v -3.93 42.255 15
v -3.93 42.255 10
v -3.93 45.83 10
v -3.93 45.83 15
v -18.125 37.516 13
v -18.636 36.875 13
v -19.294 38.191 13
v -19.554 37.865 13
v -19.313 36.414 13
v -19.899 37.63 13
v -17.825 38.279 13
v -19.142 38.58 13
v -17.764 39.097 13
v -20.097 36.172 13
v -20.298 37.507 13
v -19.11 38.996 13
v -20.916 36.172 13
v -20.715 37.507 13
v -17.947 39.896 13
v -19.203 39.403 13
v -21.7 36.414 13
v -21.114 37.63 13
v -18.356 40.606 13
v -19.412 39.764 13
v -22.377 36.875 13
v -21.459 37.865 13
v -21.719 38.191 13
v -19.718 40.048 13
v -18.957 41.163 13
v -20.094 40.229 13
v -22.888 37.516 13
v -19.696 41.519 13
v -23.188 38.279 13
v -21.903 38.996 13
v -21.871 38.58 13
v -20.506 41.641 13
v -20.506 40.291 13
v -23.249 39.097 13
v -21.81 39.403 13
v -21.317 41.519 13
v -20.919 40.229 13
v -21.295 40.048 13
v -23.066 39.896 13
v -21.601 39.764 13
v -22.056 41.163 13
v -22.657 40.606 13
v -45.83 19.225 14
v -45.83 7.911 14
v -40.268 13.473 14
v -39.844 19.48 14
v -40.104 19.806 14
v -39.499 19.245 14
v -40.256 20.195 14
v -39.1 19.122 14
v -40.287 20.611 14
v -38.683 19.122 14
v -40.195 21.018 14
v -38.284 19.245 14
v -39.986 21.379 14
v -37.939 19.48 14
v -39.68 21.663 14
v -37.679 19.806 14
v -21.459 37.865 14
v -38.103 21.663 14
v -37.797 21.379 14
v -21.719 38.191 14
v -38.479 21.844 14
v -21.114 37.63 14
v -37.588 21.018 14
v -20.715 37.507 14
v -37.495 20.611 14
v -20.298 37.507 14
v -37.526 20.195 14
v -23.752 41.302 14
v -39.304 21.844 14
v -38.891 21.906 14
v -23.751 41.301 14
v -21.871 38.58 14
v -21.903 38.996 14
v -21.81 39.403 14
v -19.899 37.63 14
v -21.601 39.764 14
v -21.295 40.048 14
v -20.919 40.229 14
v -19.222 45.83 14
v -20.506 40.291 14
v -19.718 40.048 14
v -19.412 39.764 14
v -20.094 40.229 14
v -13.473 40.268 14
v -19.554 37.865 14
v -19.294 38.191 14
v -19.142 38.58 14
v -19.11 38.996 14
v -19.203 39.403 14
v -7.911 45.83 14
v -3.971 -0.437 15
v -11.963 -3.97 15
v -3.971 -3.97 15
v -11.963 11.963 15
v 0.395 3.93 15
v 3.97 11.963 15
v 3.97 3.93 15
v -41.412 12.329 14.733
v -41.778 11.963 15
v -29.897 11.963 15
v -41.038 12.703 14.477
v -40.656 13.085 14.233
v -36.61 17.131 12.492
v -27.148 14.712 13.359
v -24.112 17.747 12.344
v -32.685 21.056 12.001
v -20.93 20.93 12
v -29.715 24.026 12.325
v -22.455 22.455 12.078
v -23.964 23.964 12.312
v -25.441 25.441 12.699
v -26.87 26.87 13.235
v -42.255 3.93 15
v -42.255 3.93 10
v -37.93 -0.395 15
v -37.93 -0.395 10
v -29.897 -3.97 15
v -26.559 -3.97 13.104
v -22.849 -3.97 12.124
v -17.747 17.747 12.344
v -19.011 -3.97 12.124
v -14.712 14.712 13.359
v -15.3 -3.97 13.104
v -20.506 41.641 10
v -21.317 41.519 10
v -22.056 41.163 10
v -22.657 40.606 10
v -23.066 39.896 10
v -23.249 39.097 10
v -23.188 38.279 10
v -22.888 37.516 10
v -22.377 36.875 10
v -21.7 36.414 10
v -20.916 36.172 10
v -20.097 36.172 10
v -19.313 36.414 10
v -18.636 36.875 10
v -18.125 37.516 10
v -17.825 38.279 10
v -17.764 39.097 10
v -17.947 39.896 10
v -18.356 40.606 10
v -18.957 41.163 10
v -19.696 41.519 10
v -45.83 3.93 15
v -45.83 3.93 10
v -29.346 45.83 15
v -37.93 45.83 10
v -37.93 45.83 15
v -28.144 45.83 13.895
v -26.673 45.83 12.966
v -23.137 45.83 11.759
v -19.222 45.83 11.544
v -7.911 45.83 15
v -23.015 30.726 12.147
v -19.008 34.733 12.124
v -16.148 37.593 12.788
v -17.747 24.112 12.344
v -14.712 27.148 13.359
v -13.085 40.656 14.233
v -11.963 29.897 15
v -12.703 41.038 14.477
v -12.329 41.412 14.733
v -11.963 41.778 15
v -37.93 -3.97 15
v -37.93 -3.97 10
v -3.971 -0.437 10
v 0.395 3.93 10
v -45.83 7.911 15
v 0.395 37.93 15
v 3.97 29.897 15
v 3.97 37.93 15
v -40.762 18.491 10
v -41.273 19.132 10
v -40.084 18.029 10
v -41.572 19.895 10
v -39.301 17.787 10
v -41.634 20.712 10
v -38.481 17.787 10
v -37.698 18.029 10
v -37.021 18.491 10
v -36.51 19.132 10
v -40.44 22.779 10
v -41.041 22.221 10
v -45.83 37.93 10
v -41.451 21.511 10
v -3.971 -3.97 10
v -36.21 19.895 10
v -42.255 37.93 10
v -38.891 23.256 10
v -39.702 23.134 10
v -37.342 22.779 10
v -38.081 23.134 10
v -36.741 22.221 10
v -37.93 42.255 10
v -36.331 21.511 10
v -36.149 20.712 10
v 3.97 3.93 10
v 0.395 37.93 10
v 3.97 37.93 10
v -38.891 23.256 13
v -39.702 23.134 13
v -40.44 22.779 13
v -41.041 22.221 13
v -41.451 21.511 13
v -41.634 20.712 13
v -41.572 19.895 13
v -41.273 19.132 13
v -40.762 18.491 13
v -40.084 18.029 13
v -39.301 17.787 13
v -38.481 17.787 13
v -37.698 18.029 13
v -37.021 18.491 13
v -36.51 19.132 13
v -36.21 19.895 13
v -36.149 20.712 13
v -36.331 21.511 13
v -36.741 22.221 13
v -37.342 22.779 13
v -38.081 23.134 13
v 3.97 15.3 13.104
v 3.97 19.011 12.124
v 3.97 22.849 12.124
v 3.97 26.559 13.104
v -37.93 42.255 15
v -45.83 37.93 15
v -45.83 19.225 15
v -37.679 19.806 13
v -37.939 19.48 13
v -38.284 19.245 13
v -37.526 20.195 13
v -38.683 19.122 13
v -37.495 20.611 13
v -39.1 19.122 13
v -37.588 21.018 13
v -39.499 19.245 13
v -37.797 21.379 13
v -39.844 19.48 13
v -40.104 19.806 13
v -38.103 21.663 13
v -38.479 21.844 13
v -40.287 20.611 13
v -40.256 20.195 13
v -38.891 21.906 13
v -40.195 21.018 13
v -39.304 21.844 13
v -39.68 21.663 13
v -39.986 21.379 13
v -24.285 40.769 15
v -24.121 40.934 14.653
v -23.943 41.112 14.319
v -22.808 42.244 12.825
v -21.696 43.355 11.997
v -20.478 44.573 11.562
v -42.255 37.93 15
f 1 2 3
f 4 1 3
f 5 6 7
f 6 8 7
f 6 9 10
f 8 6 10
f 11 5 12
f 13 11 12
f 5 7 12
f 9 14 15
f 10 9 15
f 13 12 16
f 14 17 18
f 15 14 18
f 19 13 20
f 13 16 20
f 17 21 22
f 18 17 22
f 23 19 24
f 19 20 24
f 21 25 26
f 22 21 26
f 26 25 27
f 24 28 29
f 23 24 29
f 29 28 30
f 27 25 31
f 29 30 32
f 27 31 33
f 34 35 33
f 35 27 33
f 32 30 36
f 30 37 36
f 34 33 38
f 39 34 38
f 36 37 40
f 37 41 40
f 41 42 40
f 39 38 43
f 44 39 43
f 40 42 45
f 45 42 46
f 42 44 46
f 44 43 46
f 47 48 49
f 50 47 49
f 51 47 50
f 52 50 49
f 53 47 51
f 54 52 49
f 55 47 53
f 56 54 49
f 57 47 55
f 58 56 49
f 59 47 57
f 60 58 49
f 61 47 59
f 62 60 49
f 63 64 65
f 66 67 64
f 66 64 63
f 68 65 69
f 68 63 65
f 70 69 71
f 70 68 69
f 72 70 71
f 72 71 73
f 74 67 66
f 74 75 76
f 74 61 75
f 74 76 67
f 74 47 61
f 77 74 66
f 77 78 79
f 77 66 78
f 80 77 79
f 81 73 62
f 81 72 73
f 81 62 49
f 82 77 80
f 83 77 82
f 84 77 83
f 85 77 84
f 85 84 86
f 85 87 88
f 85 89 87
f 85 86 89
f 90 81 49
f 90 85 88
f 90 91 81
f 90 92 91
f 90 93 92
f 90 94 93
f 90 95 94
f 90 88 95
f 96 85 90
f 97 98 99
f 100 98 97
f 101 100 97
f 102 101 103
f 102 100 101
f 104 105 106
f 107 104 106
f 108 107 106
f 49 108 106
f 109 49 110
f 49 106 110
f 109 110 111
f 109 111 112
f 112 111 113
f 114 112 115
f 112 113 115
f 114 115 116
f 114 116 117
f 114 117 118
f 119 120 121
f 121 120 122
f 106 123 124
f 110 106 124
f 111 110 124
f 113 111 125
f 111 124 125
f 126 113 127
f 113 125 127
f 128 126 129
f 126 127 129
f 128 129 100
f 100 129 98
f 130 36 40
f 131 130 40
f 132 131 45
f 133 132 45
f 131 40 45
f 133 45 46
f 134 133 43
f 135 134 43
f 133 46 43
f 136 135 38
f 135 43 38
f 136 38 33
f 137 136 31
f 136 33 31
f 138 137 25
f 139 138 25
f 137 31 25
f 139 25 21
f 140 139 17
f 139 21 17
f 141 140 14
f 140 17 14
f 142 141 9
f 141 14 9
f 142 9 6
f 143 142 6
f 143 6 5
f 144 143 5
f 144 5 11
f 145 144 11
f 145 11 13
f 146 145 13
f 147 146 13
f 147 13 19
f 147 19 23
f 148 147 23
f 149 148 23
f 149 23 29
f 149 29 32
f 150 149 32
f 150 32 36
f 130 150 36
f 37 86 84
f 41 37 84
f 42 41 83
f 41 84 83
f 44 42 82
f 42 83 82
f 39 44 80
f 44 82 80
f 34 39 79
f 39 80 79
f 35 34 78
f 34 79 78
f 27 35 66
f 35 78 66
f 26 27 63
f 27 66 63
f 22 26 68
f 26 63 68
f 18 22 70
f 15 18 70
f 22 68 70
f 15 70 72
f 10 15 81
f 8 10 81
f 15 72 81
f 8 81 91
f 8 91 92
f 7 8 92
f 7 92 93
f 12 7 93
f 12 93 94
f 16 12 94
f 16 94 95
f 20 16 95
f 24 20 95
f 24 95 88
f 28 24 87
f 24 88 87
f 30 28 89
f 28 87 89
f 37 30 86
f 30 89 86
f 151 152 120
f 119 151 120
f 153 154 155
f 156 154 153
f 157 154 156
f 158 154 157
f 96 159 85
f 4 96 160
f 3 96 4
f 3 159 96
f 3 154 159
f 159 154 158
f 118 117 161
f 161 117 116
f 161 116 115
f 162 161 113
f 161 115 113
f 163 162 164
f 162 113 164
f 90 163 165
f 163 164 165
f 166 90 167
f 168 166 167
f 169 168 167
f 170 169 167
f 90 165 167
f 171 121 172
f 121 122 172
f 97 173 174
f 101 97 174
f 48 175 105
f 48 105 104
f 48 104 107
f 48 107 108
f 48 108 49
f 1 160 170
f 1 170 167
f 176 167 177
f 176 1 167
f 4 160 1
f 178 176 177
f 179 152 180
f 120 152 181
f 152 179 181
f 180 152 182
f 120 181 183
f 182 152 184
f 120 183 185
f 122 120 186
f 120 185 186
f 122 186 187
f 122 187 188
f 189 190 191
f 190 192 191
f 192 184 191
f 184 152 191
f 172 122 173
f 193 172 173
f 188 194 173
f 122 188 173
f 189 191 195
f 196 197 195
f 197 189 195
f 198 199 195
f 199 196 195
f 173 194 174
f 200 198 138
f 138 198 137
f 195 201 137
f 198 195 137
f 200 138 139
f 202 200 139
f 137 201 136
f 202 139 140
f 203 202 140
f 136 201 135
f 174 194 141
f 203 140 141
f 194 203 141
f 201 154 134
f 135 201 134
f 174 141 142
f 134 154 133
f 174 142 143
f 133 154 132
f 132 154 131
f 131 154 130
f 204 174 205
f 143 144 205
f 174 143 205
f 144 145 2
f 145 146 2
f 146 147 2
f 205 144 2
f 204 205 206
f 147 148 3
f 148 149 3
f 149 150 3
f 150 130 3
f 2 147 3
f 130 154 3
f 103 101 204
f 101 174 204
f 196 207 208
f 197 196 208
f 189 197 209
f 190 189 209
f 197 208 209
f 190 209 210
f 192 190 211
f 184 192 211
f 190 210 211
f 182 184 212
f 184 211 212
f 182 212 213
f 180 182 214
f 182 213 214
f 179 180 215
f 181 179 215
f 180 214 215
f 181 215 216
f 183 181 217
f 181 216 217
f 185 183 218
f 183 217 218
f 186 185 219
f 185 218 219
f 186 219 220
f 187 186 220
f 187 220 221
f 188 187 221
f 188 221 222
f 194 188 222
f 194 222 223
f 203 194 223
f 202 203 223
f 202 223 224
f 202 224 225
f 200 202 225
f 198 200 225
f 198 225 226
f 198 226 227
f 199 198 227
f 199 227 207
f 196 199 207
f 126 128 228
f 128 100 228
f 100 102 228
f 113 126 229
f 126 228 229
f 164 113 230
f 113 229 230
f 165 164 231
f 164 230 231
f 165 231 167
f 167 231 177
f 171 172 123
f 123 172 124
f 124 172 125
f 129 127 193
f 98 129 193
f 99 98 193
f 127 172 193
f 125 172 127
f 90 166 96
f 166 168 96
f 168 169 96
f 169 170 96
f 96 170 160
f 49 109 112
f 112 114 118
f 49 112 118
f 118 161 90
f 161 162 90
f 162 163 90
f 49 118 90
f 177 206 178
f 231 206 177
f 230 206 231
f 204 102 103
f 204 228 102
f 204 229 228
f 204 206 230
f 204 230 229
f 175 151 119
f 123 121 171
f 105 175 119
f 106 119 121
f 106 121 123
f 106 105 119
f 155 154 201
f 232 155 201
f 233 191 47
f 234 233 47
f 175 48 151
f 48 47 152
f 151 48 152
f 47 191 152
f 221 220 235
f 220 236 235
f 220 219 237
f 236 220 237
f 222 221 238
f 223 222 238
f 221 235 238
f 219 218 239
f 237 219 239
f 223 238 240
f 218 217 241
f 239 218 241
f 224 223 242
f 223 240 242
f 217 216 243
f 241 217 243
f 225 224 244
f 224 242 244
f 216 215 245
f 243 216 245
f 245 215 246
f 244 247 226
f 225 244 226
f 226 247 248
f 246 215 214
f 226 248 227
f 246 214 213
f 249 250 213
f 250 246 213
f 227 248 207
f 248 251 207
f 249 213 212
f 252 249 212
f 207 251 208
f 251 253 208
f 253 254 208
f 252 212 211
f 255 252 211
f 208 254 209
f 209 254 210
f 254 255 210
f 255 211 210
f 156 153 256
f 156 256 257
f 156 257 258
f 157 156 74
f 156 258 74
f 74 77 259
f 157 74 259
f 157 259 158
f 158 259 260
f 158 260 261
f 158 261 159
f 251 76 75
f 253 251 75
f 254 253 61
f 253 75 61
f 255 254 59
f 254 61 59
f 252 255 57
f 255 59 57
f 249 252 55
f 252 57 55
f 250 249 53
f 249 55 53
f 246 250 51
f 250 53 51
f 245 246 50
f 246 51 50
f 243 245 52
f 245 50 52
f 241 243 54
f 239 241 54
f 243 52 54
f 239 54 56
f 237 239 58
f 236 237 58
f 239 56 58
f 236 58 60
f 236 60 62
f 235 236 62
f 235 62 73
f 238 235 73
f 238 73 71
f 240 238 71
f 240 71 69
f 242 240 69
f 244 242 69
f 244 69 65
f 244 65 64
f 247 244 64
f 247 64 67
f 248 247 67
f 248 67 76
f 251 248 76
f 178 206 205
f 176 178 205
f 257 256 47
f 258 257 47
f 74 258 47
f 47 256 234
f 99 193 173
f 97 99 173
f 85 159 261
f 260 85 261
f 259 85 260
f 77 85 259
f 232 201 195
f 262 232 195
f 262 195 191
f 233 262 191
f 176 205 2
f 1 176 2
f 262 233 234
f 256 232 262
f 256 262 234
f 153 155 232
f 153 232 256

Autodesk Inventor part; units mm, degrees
ref_plane "Work Plane1" through (0, 0, 10) normal (0, 0, 1) x (1, 0, 0)
sketch "Sketch1" plane through (0, 0, 10) normal (0, 0, 1) x (1, 0, 0)
  line L0 (-4.0299, -0.3538) -> (-2.2322, 1.4439) construction
  arc A0 (-1.4439, 2.2322) -> (-2.2322, 1.4439) centre (-0.9299, 0.9299) ccw construction
  line L1 (-1.4439, 2.2322) -> (0.3538, 4.0299) construction
  line L2 (-37.8299, 42.8299) -> (-37.8299, 37.8299) construction
  line L3 (-37.8299, 37.8299) -> (-42.9208, 37.8299) construction
  line L4 (-37.8299, 42.2137) -> (-37.8299, 45.8299) construction
  line L5 (-37.8299, 45.8299) -> (-4.0299, 45.8299) construction
  line L6 (-4.0299, 45.8299) -> (-4.0299, 42.2137) construction
  line L7 (-4.0299, 4.0299) -> (0.3538, 4.0299) projected
  circle A1 centre (-20.9299, 20.9299) radius 17.5 projected
  line L8 (-20.9299, 58.9723) -> (17.1124, 20.9299) construction
  line L9 (17.1124, 20.9299) -> (-20.9299, -17.1124) construction
  line L10 (-20.9299, -17.1124) -> (-58.9723, 20.9299) construction
  line L11 (-58.9723, 20.9299) -> (-20.9299, 58.9723) construction
  line L12 (-20.9299, 58.9723) -> (-20.9299, -17.1124) construction
  line L13 (17.1124, 20.9299) -> (-58.9723, 20.9299) construction
  line L14 (-20.9299, 58.9723) -> (32.8701, 58.9723) construction
  line L15 (-43.4299, 43.4299) -> (1.5701, 43.4299) construction
  line L16 (1.5701, 43.4299) -> (1.5701, -1.5701) construction
  line L17 (1.5701, -1.5701) -> (-43.4299, -1.5701) construction
  line L18 (-43.4299, -1.5701) -> (-43.4299, 43.4299) construction
  line L19 (-43.4299, 43.4299) -> (1.5701, -1.5701) construction
  line L20 (1.5701, 43.4299) -> (-43.4299, -1.5701) construction
  line L21 (-43.4299, 5.3876) -> (-43.4299, 36.4723)
  line L22 (-43.4299, 36.4723) -> (-36.4723, 43.4299)
  line L23 (-36.4723, 43.4299) -> (-5.3876, 43.4299)
  line L24 (-5.3876, 43.4299) -> (1.5701, 36.4723)
  line L25 (1.5701, 36.4723) -> (1.5701, 5.3876)
  line L26 (1.5701, 5.3876) -> (-5.3876, -1.5701)
  line L27 (-5.3876, -1.5701) -> (-36.4723, -1.5701)
  line L28 (-36.4723, -1.5701) -> (-43.4299, 5.3876)
  line L29 (-4.0299, 42.2137) -> (-37.8299, 42.2137) projected
  line L30 (-4.0299, -0.3538) -> (-4.0299, 4.0299) projected
  circle A2 centre (-20.9299, 20.9299) radius 1.4
  line L31 (-10.9299, 10.9299) -> (-30.9299, 10.9299) construction
  line L32 (-30.9299, 10.9299) -> (-30.9299, 30.9299) construction
  line L33 (-30.9299, 30.9299) -> (-10.9299, 30.9299) construction
  line L34 (-10.9299, 30.9299) -> (-10.9299, 10.9299) construction
  line L35 (-10.9299, 10.9299) -> (-30.9299, 30.9299) construction
  line L36 (-30.9299, 10.9299) -> (-10.9299, 30.9299) construction
  circle A3 centre (-30.9299, 30.9299) radius 1.4
  circle A4 centre (-30.9299, 10.9299) radius 1.4
  circle A5 centre (-10.9299, 10.9299) radius 1.4
  line L37 (-45.8299, 37.8299) -> (-42.0723, 37.8299) construction
  line L38 (-42.1723, 37.7299) -> (-45.8299, 37.7299)
  line L39 (-45.8299, 37.7299) -> (-45.8299, 4.1299)
  line L40 (-45.8299, 4.1299) -> (-42.1723, 4.1299)
  line L41 (-42.1723, 4.1299) -> (-42.1723, 37.7299)
  line L42 (-45.8299, 4.0299) -> (-42.0723, 4.0299) construction
  line L43 (-45.8299, 37.8299) -> (-42.0723, 37.8299) projected
  line L44 (-37.7299, 45.8299) -> (-4.1299, 45.8299)
  line L45 (-4.1299, 45.8299) -> (-4.1299, 42.1723)
  line L46 (-4.1299, 42.1723) -> (-37.7299, 42.1723)
  line L47 (-37.7299, 42.1723) -> (-37.7299, 45.8299)
  line L48 (0.4701, 37.8299) -> (0.4701, 4.0299) construction
  line L49 (0.4701, 4.0299) -> (3.9701, 4.0299) construction
  line L50 (3.9701, 37.8299) -> (3.9701, 4.0299) construction
  line L51 (0.4701, 37.8299) -> (3.9701, 37.8299) construction
  line L52 (-45.8299, -3.9701) -> (-4.0299, -3.9701) construction
  line L53 (0.3124, 37.7299) -> (3.9701, 37.7299)
  line L54 (3.9701, 37.7299) -> (3.9701, 4.1299)
  line L55 (3.9701, 4.1299) -> (0.3124, 4.1299)
  line L56 (0.3124, 4.1299) -> (0.3124, 37.7299)
  line L57 (-4.1713, -0.3538) -> (-37.7299, -0.3538)
  line L58 (-37.7299, -0.3538) -> (-37.7299, -3.9701)
  line L59 (-37.7299, -3.9701) -> (-4.1713, -3.9701)
  line L60 (-4.1713, -3.9701) -> (-4.1713, -0.3538)
  point P0 (-37.8299, 4.0299)
  dimension "d18" = 53.8
  dimension "d19" = 45
  dimension "d20" = 53.8
  dimension "d21" = 45
  dimension "d22" = 45
  dimension "d30" = 20
  dimension "d31" = 20
  dimension "d32" = 2.8
  dimension "d33" = 2.8
  dimension "d34" = 2.8
  dimension "d35" = 2.8
  dimension "d36" = 0.1
  dimension "d37" = 0.1
  dimension "d38" = 0.1
  dimension "d39" = 0.1
extrude "Extrusion1" add sketch "Sketch1" along normal blind 5 contours L30 L26 L57 L28 L41 L22 L46 L24 L56 L7 | L7 L26 L30 | L56 L24 L25 L26 | L26 L25 L24 L53 L54 L55 | L60 L59 L58 L57 L28 L27 L26 | L26 L27 L28 L57 | L46 L22 L29 L24 | L24 L29 L45 | L40 L39 L38 L22 L21 L28 | L28 L21 L22 L41 | L29 L22 L23 L24 | L24 L23 L22 L29 L47 L44 L45 | L47 L29 L22 | A1 | A2 | A3 | A4 | A5
sketch "Sketch4" plane through (0, 0, 15) normal (0, 0, 1) x (1, 0, 0)
  line L0 (-37.7299, 42.1723) -> (-42.1723, 37.7299) projected
  line L1 (-42.1723, 37.7299) -> (-45.8299, 37.7299) projected
  line L2 (-45.8299, 37.7299) -> (-45.8299, 4.1299) projected
  line L3 (-45.8299, 4.1299) -> (-42.1723, 4.1299) projected
  line L4 (-42.1723, 4.1299) -> (-37.6885, -0.3538) projected
  line L5 (-37.6885, -0.3538) -> (-37.7299, -0.3538) projected
  line L6 (-37.7299, -0.3538) -> (-37.7299, -3.9701) projected
  line L7 (-37.7299, -3.9701) -> (-4.1713, -3.9701) projected
  line L8 (-4.1713, -3.9701) -> (-4.1713, -0.3538) projected
  line L9 (-4.1713, -0.3538) -> (0.3124, 4.1299) projected
  line L10 (0.3124, 4.1299) -> (3.9701, 4.1299) projected
  line L11 (3.9701, 4.1299) -> (3.9701, 37.7299) projected
  line L12 (3.9701, 37.7299) -> (0.3124, 37.7299) projected
  line L13 (0.3124, 37.7299) -> (-4.1299, 42.1723) projected
  line L14 (-4.1299, 42.1723) -> (-4.1299, 45.8299) projected
  line L15 (-4.1299, 45.8299) -> (-37.7299, 45.8299) projected
  line L16 (-37.7299, 45.8299) -> (-37.7299, 42.1723) projected
  line L17 (-45.8299, 37.7299) -> (-45.8299, 4.1299) projected
  line L18 (-45.8299, 7.911) -> (-7.911, 45.8299)
  line L19 (-45.8299, 7.911) -> (7.7955, 7.911) construction
  line L20 (-7.911, 45.8299) -> (-19.2247, 45.8299)
  line L21 (-4.1299, 45.8299) -> (-37.7299, 45.8299) projected
  line L22 (-19.2247, 45.8299) -> (-45.8299, 19.2247)
  line L23 (-45.8299, 7.911) -> (-45.8299, 19.2247)
  circle A0 centre (-40.9299, 0.9299) radius 1.1933 projected
  circle A1 centre (-0.9299, 40.9299) radius 1.4 projected
  line L24 (-40.9299, 0.9299) -> (-0.9299, 40.9299)
  line L25 (0.3124, 37.7299) -> (-4.1299, 42.1723) projected
  point P0 (0, 0)
  dimension "d40" = 45
  dimension "d41" = 8
extrude "Extrusion4" add sketch "Sketch4" along normal blind 28 contours L15 L18 L2 L22
sketch "Sketch5" plane through (-45.8299, 19.2247, 15) normal (-0.7071068, 0.7071068, 0) x (-0.7071068, -0.7071068, 0)
  line L0 (0, 0) -> (-37.6254, 0) projected
  line L1 (0, 0) -> (0, 28) projected
  line L2 (-37.6254, 28) -> (0, 28) projected
  line L3 (-37.6254, 0) -> (-37.6254, 28) projected
  circle A0 centre (-18.8127, 9.1873) radius 18.8127
  line L4 (-6.8127, 24) -> (-36.8127, 24) construction
  line L5 (-36.8127, 24) -> (-36.8127, 4) construction
  line L6 (-36.8127, 4) -> (-6.8127, 4) construction
  line L7 (-6.8127, 4) -> (-6.8127, 24) construction
  line L8 (-6.8127, 24) -> (-36.8127, 4) construction
  line L9 (-36.8127, 24) -> (-6.8127, 4) construction
  point P0 (-18.8127, -15)
  point P1 (-21.8127, 14)
  dimension "d44" = 30
  dimension "d45" = 20
hole "Hole1" at (-19.7994, 45.2552, 39) at (-19.7994, 45.2552, 19) at (-41.0126, 24.042, 39) at (-30.406, 34.6486, 29) direction (0.7071068, -0.7071068, 0) diameter 2.8 depth 12
sketch "Sketch6" plane through (-37.7299, -3.9701, 10) normal (0, -1, 0) x (1, 0, 0)
  circle A0 centre (-3.2, 36.9) radius 1.45 projected
  circle A1 centre (36.8, 36.9) radius 1.45 projected
  line L0 (-6.1, 0) -> (-6.1, 39.8) projected
  line L1 (-0.1, 0) -> (-6.1, 0) projected
  line L2 (-0.1, 33.8) -> (-0.1, 0) projected
  line L3 (33.7, 33.8) -> (-0.1, 33.8) projected
  line L4 (33.7, 33.8) -> (33.7, 0) projected
  line L5 (39.7, 0) -> (33.7, 0) projected
  line L6 (39.7, 39.8) -> (39.7, 0) projected
  line L7 (-6.1, 39.8) -> (39.7, 39.8) projected
  circle A2 centre (16.8, 16.9) radius 16.9
  circle A3 centre (16.8, 16.9) radius 14.9
  line L8 (-0.1, 16.9) -> (-0.1, 0)
  line L9 (0, 0) -> (33.5586, 0) projected
  line L10 (0.0414, 0) -> (-4.4423, 0) projected
  line L11 (33.5586, 0) -> (0.0414, 0)
  line L12 (33.7, 16.9) -> (33.5586, 0)
  point P0 (37.7299, -10)
  dimension "d53" = 2
extrude "Extrusion5" cut sketch "Sketch6" against normal up to surface contours A3 surface through (-45.8299, 7.911, 15) normal (0.7071068, -0.7071068, 0)
ref_plane "Work Plane3" through (3.9701, 45.8299, 26) normal (1, 0, 0) x (0, -1, 0)
sketch "Sketch7" plane through (3.9701, 45.8299, 26) normal (1, 0, 0) x (0, -1, 0)
  line L0 (41.8, -17.8) -> (41.8, 16) projected
  line L1 (8, -17.8) -> (41.8, -17.8) projected
  line L2 (8, -17.8) -> (8, 16) projected
  circle A0 centre (24.9, -0.9) radius 16.9
  circle A1 centre (24.9, -0.9) radius 14.9
  point P0 (45.8299, 26)
  dimension "d56" = 2
ref_plane "Work Plane4" through (-34.8055, 8.3289, 16.6138) normal (0.7071068, -0.7071068, 0) x (0.7071068, 0.7071068, 0)
extrude "Extrusion6" cut sketch "Sketch7" against normal up to surface contours A1 surface through (-45.8299, 7.911, 15) normal (0.7071068, -0.7071068, 0)
sketch "Sketch8" plane through (-45.8299, 19.2247, 15) normal (-0.7071068, 0.7071068, 0) x (-0.7071068, -0.7071068, 0)
  arc A0 (-37.6254, 2.8601) -> (-37.6254, 5.1399) centre (-36.8127, 4) ccw projected
  circle A1 centre (-36.8127, 4) radius 7.5
  point P0 (-18.8127, -15)
  dimension "d59" = 15
extrude "Extrusion7" cut sketch "Sketch8" along normal blind 10
sketch "Sketch9" plane through (0, 0, 10) normal (0, 0, -1) x (-1, 0, 0)
  line L0 (45.8299, 19.2247) -> (24.2855, 40.7692) projected
  line L1 (41.7776, 11.9633) -> (26.8705, 26.8705) projected
  line L2 (26.8705, 26.8705) -> (11.9633, 41.7776) projected
  line L3 (19.2247, 45.8299) -> (24.2855, 40.7692) projected
  line L4 (7.911, 45.8299) -> (11.9633, 41.7776) projected
  line L5 (41.7776, 11.9633) -> (45.8299, 7.911) projected
  line L6 (15.1325, 38.6084) -> (20.7894, 44.2653) projected
  line L7 (13.1526, 40.5883) -> (18.3942, 45.8299) projected
  line L8 (34.3658, 19.3751) -> (40.0227, 25.032) projected
  line L9 (36.3457, 17.3952) -> (42.0026, 23.0521) projected
  circle A0 centre (20.5065, 38.8913) radius 1.4
  line L10 (25.7391, 28.0018) -> (31.396, 33.6587) projected
  line L11 (31.396, 33.6587) -> (25.7391, 28.0018)
  line L12 (26.8705, 26.8705) -> (32.5273, 32.5273)
  circle A1 centre (38.8913, 20.5065) radius 1.4
  point P0 (0, 0)
  point P1 (34.7528, 24.7491)
  dimension "d62" = 2.8
hole "Hole2" at (-20.5065, 38.8913, 10) at (-38.8913, 20.5065, 10) direction (0, 0, 1) diameter 2.8 depth 12 counterbore diameter 5.5 counterbore depth 3
sketch "Sketch13" plane through (0, 0, 43) normal (0, 0, 1) x (1, 0, 0)
  line L0 (-7.911, 45.8299) -> (-19.2247, 45.8299) projected
  line L1 (-19.2247, 45.8299) -> (-45.8299, 19.2247) projected
  line L2 (-45.8299, 19.2247) -> (-45.8299, 7.911) projected
  line L3 (-45.8299, 7.911) -> (-7.911, 45.8299) projected
  point P0 (0, 0)
extrude "Extrusion10" cut sketch "Sketch13" against normal blind 29
sketch "Sketch14" plane through (0, 0, 10) normal (0, 0, -1) x (-1, 0, 0)
  circle A0 centre (20.5065, 38.8913) radius 2.75 construction
  circle A1 centre (38.8913, 20.5065) radius 2.75 construction
  line L0 (42.1723, 37.7299) -> (37.7299, 42.1723) projected
  line L1 (37.7299, 45.8299) -> (37.7299, 42.1723) projected
  line L2 (4.1299, 45.8299) -> (37.7299, 45.8299) construction
  line L3 (4.1299, 42.1723) -> (4.1299, 45.8299) projected
  line L4 (4.1299, 42.1723) -> (-0.3124, 37.7299) projected
  line L5 (-3.9701, 37.7299) -> (-0.3124, 37.7299) projected
  line L6 (-3.9701, 4.1299) -> (-3.9701, 37.7299) construction
  line L7 (-0.3124, 4.1299) -> (-3.9701, 4.1299) projected
  line L8 (-0.3124, 4.1299) -> (4.1713, -0.3538) projected
  line L9 (4.1713, -3.9701) -> (4.1713, -0.3538) projected
  line L10 (37.7299, -3.9701) -> (4.1713, -3.9701) construction
  line L11 (37.7299, -0.3538) -> (37.7299, -3.9701) projected
  line L12 (37.6885, -0.3538) -> (37.7299, -0.3538) projected
  line L13 (37.6885, -0.3538) -> (42.1723, 4.1299) projected
  line L14 (45.8299, 4.1299) -> (42.1723, 4.1299) projected
  line L15 (45.8299, 37.7299) -> (45.8299, 4.1299) construction
  line L16 (42.1723, 37.7299) -> (45.8299, 37.7299) projected
  line L17 (3.9713, -4.1701) -> (3.9713, -0.4367)
  line L18 (3.9713, -0.4367) -> (-0.3953, 3.9299)
  line L19 (-0.3953, 3.9299) -> (-4.1701, 3.9299)
  line L20 (-4.1701, 3.9299) -> (-4.1701, 37.9299) construction
  line L21 (-4.1701, 37.9299) -> (-0.3953, 37.9299)
  line L22 (-0.3953, 37.9299) -> (3.9299, 42.2551)
  line L23 (3.9299, 42.2551) -> (3.9299, 46.0299)
  line L24 (3.9299, 46.0299) -> (37.9299, 46.0299) construction
  line L25 (37.9299, 46.0299) -> (37.9299, 42.2551)
  line L26 (37.9299, 42.2551) -> (42.2551, 37.9299)
  line L27 (42.2551, 37.9299) -> (46.0299, 37.9299)
  line L28 (46.0299, 37.9299) -> (46.0299, 3.9299) construction
  line L29 (46.0299, 3.9299) -> (42.2551, 3.9299)
  line L30 (42.2551, 3.9299) -> (37.9299, -0.3953)
  line L31 (37.9299, -0.3953) -> (37.9299, -4.1701)
  line L32 (37.9299, -4.1701) -> (3.9713, -4.1701) construction
  line L33 (45.8299, 4.1299) -> (42.1723, 4.1299) projected
  line L34 (45.8299, 4.1299) -> (45.8299, 3.9299)
  line L35 (37.7299, -0.3538) -> (37.7299, -3.9701) projected
  line L36 (37.7299, -3.9701) -> (37.9299, -3.9701)
  line L37 (4.1713, -3.9701) -> (4.1713, -0.3538) projected
  line L38 (4.1713, -3.9701) -> (3.9713, -3.9701)
  line L39 (-0.3124, 4.1299) -> (-3.9701, 4.1299) projected
  line L40 (-3.9701, 4.1299) -> (-3.9701, 3.9299)
  line L41 (4.1299, 45.8299) -> (3.9299, 45.8299)
  line L42 (-3.9701, 37.7299) -> (-3.9701, 37.9299)
  line L43 (42.1723, 37.7299) -> (45.8299, 37.7299) projected
  line L44 (45.8299, 37.7299) -> (45.8299, 37.9299)
  line L45 (37.7299, 45.8299) -> (37.7299, 42.1723) projected
  line L46 (37.7299, 45.8299) -> (37.9299, 45.8299)
  point P0 (0, 0)
  dimension "d78" = 0.2
extrude "Extrusion11" add sketch "Sketch14" against normal up to surface (5 mm away)
sketch "Sketch11" plane through (0, 0, 43) normal (0, 0, 1) x (1, 0, 0)
  line L0 (-7.911, 45.8299) -> (-19.2247, 45.8299) projected
  line L1 (-19.2247, 45.8299) -> (-45.8299, 19.2247) projected
  line L2 (-45.8299, 19.2247) -> (-45.8299, 7.911) projected
  line L3 (-45.8299, 7.911) -> (-7.911, 45.8299) projected
  line L4 (-45.8299, 37.7299) -> (-45.8299, 19.2247) projected
  line L5 (-42.1723, 37.7299) -> (-45.8299, 37.7299) projected
  line L6 (-37.7299, 42.1723) -> (-42.1723, 37.7299) projected
  line L7 (-37.7299, 45.8299) -> (-37.7299, 42.1723) projected
  line L8 (-29.3463, 45.8299) -> (-37.7299, 45.8299) projected
  line L9 (-29.3463, 45.8299) -> (-19.2247, 45.8299) projected
  line L10 (-4.1299, 45.8299) -> (-7.911, 45.8299) projected
  line L11 (-4.1299, 42.1723) -> (-4.1299, 45.8299) projected
  line L12 (0.3124, 37.7299) -> (-4.1299, 42.1723) projected
  line L13 (3.9701, 37.7299) -> (0.3124, 37.7299) projected
  line L14 (3.9701, 29.8965) -> (3.9701, 11.9633) projected
  line L15 (3.9701, 29.8965) -> (3.9701, 37.7299) projected
  line L16 (-11.9633, -3.9701) -> (-4.1713, -3.9701) projected
  line L17 (-4.1713, -3.9701) -> (-4.1713, -0.3538) projected
  line L18 (-4.1713, -0.3538) -> (0.3124, 4.1299) projected
  line L19 (0.3124, 4.1299) -> (3.9701, 4.1299) projected
  line L20 (3.9701, 4.1299) -> (3.9701, 11.9633) projected
  line L21 (-11.9633, -3.9701) -> (-29.8965, -3.9701) projected
  line L22 (-37.7299, -3.9701) -> (-29.8965, -3.9701) projected
  line L23 (-37.7299, -0.3538) -> (-37.7299, -3.9701) projected
  line L24 (-45.8299, 7.911) -> (-7.911, 45.8299) projected
  line L25 (-45.8299, 7.911) -> (-7.911, 45.8299)
  line L26 (-45.8299, 7.911) -> (-45.8299, 4.1299) projected
  line L27 (-45.8299, 4.1299) -> (-42.1723, 4.1299) projected
  line L28 (-37.6885, -0.3538) -> (-37.7299, -0.3538) projected
  line L29 (-42.1723, 4.1299) -> (-37.6885, -0.3538) projected
  point P0 (0, 0)
sketch "Sketch12" plane through (-45.8299, 19.2247, 10) normal (-0.7071068, 0.7071068, 0) x (-0.7071068, -0.7071068, 0)
  line L0 (-45.6254, 33) -> (-45.6254, 0) projected
  line L1 (8, 0) -> (8, 33) projected
  line L2 (-45.6254, 0) -> (8, 0)
  line L3 (8, 0) -> (8, 4)
  line L4 (8, 4) -> (-45.6254, 4)
  line L5 (-45.6254, 4) -> (-45.6254, 0)
  point P0 (-18.8127, -10)
  point P1 (45.6254, -4)
  point P2 (45.6254, -5)
  point P3 (-8, -5)
  point P4 (-8, -4)
  dimension "d73" = 4
properties part number "20_Cube_Insert_Kinematic_Mirrormount_45_base_part1"
